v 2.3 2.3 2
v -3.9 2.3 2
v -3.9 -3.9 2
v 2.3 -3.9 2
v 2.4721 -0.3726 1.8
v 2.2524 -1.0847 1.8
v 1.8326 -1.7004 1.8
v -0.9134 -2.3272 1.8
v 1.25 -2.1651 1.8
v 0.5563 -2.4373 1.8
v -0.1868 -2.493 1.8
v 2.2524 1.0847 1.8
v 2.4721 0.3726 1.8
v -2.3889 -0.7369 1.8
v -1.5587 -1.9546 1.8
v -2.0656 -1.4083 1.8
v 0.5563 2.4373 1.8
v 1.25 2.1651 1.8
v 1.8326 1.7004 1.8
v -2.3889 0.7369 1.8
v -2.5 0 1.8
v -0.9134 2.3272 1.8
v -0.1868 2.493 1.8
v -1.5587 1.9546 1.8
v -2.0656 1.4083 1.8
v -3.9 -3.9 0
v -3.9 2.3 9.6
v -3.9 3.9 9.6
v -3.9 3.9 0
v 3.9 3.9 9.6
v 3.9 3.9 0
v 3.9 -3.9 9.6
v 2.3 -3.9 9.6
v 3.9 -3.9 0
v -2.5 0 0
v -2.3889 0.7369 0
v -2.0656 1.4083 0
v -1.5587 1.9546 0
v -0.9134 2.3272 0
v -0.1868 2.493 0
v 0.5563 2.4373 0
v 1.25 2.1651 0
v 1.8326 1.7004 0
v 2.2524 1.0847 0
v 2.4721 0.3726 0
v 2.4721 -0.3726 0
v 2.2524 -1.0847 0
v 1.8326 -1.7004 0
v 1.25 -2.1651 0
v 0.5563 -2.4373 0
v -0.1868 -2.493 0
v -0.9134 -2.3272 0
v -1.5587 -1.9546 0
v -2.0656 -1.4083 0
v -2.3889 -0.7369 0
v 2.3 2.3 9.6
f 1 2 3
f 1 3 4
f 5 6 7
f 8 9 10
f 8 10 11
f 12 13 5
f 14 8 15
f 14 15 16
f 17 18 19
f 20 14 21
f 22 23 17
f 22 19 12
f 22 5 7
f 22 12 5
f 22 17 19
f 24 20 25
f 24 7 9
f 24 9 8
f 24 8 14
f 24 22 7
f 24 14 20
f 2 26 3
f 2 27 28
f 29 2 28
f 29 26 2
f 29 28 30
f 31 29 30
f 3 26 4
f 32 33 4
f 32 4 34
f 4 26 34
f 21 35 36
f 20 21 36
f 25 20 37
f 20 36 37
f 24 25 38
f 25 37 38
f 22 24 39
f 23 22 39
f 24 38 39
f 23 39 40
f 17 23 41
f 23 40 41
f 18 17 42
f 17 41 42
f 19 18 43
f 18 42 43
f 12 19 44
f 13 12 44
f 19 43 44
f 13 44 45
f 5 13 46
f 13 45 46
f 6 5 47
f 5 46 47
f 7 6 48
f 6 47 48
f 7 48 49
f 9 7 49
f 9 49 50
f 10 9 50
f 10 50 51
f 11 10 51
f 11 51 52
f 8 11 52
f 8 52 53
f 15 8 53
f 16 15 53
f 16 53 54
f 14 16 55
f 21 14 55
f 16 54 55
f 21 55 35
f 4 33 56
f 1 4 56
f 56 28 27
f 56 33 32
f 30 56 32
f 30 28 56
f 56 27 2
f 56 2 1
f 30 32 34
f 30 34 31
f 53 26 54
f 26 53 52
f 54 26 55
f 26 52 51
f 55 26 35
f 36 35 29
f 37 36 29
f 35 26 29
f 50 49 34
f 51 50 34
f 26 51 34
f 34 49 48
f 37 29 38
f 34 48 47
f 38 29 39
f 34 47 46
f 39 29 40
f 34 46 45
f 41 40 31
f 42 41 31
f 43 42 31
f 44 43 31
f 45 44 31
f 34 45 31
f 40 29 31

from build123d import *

# Parameters (mm, degrees)
SKETCH_1_W          = 7.8
SKETCH_1_H          = 7.8
EXTRUDE_1_DEPTH     = 9.6
SKETCH_6_W          = 6.2
SKETCH_6_H          = 6.2
CUT_EXTRUDE_8_DEPTH = 7.6
SKETCH_9_R          = 2.5
CUT_EXTRUDE_9_DEPTH = 1.8


with BuildPart() as part:
    # Эскиз1 → Бобышка-Вытянуть1 (new body)
    with BuildSketch(Plane.XY):
        Rectangle(SKETCH_1_W, SKETCH_1_H)
    extrude(amount=EXTRUDE_1_DEPTH)

    # Эскиз6 → Вырез-Вытянуть8 (cut)
    with BuildSketch(Plane.XY.offset(9.6)):
        with Locations((-0.8, -0.8)):
            Rectangle(SKETCH_6_W, SKETCH_6_H)
    extrude(amount=-CUT_EXTRUDE_8_DEPTH, mode=Mode.SUBTRACT)

    # Эскиз9 → Вырез-Вытянуть9 (cut)
    with BuildSketch(Plane(origin=(0, 0, 0), x_dir=(-1, 0, 0), z_dir=(0, 0, -1))):
        Circle(SKETCH_9_R)
    extrude(amount=-CUT_EXTRUDE_9_DEPTH, mode=Mode.SUBTRACT)


solid = part.part
